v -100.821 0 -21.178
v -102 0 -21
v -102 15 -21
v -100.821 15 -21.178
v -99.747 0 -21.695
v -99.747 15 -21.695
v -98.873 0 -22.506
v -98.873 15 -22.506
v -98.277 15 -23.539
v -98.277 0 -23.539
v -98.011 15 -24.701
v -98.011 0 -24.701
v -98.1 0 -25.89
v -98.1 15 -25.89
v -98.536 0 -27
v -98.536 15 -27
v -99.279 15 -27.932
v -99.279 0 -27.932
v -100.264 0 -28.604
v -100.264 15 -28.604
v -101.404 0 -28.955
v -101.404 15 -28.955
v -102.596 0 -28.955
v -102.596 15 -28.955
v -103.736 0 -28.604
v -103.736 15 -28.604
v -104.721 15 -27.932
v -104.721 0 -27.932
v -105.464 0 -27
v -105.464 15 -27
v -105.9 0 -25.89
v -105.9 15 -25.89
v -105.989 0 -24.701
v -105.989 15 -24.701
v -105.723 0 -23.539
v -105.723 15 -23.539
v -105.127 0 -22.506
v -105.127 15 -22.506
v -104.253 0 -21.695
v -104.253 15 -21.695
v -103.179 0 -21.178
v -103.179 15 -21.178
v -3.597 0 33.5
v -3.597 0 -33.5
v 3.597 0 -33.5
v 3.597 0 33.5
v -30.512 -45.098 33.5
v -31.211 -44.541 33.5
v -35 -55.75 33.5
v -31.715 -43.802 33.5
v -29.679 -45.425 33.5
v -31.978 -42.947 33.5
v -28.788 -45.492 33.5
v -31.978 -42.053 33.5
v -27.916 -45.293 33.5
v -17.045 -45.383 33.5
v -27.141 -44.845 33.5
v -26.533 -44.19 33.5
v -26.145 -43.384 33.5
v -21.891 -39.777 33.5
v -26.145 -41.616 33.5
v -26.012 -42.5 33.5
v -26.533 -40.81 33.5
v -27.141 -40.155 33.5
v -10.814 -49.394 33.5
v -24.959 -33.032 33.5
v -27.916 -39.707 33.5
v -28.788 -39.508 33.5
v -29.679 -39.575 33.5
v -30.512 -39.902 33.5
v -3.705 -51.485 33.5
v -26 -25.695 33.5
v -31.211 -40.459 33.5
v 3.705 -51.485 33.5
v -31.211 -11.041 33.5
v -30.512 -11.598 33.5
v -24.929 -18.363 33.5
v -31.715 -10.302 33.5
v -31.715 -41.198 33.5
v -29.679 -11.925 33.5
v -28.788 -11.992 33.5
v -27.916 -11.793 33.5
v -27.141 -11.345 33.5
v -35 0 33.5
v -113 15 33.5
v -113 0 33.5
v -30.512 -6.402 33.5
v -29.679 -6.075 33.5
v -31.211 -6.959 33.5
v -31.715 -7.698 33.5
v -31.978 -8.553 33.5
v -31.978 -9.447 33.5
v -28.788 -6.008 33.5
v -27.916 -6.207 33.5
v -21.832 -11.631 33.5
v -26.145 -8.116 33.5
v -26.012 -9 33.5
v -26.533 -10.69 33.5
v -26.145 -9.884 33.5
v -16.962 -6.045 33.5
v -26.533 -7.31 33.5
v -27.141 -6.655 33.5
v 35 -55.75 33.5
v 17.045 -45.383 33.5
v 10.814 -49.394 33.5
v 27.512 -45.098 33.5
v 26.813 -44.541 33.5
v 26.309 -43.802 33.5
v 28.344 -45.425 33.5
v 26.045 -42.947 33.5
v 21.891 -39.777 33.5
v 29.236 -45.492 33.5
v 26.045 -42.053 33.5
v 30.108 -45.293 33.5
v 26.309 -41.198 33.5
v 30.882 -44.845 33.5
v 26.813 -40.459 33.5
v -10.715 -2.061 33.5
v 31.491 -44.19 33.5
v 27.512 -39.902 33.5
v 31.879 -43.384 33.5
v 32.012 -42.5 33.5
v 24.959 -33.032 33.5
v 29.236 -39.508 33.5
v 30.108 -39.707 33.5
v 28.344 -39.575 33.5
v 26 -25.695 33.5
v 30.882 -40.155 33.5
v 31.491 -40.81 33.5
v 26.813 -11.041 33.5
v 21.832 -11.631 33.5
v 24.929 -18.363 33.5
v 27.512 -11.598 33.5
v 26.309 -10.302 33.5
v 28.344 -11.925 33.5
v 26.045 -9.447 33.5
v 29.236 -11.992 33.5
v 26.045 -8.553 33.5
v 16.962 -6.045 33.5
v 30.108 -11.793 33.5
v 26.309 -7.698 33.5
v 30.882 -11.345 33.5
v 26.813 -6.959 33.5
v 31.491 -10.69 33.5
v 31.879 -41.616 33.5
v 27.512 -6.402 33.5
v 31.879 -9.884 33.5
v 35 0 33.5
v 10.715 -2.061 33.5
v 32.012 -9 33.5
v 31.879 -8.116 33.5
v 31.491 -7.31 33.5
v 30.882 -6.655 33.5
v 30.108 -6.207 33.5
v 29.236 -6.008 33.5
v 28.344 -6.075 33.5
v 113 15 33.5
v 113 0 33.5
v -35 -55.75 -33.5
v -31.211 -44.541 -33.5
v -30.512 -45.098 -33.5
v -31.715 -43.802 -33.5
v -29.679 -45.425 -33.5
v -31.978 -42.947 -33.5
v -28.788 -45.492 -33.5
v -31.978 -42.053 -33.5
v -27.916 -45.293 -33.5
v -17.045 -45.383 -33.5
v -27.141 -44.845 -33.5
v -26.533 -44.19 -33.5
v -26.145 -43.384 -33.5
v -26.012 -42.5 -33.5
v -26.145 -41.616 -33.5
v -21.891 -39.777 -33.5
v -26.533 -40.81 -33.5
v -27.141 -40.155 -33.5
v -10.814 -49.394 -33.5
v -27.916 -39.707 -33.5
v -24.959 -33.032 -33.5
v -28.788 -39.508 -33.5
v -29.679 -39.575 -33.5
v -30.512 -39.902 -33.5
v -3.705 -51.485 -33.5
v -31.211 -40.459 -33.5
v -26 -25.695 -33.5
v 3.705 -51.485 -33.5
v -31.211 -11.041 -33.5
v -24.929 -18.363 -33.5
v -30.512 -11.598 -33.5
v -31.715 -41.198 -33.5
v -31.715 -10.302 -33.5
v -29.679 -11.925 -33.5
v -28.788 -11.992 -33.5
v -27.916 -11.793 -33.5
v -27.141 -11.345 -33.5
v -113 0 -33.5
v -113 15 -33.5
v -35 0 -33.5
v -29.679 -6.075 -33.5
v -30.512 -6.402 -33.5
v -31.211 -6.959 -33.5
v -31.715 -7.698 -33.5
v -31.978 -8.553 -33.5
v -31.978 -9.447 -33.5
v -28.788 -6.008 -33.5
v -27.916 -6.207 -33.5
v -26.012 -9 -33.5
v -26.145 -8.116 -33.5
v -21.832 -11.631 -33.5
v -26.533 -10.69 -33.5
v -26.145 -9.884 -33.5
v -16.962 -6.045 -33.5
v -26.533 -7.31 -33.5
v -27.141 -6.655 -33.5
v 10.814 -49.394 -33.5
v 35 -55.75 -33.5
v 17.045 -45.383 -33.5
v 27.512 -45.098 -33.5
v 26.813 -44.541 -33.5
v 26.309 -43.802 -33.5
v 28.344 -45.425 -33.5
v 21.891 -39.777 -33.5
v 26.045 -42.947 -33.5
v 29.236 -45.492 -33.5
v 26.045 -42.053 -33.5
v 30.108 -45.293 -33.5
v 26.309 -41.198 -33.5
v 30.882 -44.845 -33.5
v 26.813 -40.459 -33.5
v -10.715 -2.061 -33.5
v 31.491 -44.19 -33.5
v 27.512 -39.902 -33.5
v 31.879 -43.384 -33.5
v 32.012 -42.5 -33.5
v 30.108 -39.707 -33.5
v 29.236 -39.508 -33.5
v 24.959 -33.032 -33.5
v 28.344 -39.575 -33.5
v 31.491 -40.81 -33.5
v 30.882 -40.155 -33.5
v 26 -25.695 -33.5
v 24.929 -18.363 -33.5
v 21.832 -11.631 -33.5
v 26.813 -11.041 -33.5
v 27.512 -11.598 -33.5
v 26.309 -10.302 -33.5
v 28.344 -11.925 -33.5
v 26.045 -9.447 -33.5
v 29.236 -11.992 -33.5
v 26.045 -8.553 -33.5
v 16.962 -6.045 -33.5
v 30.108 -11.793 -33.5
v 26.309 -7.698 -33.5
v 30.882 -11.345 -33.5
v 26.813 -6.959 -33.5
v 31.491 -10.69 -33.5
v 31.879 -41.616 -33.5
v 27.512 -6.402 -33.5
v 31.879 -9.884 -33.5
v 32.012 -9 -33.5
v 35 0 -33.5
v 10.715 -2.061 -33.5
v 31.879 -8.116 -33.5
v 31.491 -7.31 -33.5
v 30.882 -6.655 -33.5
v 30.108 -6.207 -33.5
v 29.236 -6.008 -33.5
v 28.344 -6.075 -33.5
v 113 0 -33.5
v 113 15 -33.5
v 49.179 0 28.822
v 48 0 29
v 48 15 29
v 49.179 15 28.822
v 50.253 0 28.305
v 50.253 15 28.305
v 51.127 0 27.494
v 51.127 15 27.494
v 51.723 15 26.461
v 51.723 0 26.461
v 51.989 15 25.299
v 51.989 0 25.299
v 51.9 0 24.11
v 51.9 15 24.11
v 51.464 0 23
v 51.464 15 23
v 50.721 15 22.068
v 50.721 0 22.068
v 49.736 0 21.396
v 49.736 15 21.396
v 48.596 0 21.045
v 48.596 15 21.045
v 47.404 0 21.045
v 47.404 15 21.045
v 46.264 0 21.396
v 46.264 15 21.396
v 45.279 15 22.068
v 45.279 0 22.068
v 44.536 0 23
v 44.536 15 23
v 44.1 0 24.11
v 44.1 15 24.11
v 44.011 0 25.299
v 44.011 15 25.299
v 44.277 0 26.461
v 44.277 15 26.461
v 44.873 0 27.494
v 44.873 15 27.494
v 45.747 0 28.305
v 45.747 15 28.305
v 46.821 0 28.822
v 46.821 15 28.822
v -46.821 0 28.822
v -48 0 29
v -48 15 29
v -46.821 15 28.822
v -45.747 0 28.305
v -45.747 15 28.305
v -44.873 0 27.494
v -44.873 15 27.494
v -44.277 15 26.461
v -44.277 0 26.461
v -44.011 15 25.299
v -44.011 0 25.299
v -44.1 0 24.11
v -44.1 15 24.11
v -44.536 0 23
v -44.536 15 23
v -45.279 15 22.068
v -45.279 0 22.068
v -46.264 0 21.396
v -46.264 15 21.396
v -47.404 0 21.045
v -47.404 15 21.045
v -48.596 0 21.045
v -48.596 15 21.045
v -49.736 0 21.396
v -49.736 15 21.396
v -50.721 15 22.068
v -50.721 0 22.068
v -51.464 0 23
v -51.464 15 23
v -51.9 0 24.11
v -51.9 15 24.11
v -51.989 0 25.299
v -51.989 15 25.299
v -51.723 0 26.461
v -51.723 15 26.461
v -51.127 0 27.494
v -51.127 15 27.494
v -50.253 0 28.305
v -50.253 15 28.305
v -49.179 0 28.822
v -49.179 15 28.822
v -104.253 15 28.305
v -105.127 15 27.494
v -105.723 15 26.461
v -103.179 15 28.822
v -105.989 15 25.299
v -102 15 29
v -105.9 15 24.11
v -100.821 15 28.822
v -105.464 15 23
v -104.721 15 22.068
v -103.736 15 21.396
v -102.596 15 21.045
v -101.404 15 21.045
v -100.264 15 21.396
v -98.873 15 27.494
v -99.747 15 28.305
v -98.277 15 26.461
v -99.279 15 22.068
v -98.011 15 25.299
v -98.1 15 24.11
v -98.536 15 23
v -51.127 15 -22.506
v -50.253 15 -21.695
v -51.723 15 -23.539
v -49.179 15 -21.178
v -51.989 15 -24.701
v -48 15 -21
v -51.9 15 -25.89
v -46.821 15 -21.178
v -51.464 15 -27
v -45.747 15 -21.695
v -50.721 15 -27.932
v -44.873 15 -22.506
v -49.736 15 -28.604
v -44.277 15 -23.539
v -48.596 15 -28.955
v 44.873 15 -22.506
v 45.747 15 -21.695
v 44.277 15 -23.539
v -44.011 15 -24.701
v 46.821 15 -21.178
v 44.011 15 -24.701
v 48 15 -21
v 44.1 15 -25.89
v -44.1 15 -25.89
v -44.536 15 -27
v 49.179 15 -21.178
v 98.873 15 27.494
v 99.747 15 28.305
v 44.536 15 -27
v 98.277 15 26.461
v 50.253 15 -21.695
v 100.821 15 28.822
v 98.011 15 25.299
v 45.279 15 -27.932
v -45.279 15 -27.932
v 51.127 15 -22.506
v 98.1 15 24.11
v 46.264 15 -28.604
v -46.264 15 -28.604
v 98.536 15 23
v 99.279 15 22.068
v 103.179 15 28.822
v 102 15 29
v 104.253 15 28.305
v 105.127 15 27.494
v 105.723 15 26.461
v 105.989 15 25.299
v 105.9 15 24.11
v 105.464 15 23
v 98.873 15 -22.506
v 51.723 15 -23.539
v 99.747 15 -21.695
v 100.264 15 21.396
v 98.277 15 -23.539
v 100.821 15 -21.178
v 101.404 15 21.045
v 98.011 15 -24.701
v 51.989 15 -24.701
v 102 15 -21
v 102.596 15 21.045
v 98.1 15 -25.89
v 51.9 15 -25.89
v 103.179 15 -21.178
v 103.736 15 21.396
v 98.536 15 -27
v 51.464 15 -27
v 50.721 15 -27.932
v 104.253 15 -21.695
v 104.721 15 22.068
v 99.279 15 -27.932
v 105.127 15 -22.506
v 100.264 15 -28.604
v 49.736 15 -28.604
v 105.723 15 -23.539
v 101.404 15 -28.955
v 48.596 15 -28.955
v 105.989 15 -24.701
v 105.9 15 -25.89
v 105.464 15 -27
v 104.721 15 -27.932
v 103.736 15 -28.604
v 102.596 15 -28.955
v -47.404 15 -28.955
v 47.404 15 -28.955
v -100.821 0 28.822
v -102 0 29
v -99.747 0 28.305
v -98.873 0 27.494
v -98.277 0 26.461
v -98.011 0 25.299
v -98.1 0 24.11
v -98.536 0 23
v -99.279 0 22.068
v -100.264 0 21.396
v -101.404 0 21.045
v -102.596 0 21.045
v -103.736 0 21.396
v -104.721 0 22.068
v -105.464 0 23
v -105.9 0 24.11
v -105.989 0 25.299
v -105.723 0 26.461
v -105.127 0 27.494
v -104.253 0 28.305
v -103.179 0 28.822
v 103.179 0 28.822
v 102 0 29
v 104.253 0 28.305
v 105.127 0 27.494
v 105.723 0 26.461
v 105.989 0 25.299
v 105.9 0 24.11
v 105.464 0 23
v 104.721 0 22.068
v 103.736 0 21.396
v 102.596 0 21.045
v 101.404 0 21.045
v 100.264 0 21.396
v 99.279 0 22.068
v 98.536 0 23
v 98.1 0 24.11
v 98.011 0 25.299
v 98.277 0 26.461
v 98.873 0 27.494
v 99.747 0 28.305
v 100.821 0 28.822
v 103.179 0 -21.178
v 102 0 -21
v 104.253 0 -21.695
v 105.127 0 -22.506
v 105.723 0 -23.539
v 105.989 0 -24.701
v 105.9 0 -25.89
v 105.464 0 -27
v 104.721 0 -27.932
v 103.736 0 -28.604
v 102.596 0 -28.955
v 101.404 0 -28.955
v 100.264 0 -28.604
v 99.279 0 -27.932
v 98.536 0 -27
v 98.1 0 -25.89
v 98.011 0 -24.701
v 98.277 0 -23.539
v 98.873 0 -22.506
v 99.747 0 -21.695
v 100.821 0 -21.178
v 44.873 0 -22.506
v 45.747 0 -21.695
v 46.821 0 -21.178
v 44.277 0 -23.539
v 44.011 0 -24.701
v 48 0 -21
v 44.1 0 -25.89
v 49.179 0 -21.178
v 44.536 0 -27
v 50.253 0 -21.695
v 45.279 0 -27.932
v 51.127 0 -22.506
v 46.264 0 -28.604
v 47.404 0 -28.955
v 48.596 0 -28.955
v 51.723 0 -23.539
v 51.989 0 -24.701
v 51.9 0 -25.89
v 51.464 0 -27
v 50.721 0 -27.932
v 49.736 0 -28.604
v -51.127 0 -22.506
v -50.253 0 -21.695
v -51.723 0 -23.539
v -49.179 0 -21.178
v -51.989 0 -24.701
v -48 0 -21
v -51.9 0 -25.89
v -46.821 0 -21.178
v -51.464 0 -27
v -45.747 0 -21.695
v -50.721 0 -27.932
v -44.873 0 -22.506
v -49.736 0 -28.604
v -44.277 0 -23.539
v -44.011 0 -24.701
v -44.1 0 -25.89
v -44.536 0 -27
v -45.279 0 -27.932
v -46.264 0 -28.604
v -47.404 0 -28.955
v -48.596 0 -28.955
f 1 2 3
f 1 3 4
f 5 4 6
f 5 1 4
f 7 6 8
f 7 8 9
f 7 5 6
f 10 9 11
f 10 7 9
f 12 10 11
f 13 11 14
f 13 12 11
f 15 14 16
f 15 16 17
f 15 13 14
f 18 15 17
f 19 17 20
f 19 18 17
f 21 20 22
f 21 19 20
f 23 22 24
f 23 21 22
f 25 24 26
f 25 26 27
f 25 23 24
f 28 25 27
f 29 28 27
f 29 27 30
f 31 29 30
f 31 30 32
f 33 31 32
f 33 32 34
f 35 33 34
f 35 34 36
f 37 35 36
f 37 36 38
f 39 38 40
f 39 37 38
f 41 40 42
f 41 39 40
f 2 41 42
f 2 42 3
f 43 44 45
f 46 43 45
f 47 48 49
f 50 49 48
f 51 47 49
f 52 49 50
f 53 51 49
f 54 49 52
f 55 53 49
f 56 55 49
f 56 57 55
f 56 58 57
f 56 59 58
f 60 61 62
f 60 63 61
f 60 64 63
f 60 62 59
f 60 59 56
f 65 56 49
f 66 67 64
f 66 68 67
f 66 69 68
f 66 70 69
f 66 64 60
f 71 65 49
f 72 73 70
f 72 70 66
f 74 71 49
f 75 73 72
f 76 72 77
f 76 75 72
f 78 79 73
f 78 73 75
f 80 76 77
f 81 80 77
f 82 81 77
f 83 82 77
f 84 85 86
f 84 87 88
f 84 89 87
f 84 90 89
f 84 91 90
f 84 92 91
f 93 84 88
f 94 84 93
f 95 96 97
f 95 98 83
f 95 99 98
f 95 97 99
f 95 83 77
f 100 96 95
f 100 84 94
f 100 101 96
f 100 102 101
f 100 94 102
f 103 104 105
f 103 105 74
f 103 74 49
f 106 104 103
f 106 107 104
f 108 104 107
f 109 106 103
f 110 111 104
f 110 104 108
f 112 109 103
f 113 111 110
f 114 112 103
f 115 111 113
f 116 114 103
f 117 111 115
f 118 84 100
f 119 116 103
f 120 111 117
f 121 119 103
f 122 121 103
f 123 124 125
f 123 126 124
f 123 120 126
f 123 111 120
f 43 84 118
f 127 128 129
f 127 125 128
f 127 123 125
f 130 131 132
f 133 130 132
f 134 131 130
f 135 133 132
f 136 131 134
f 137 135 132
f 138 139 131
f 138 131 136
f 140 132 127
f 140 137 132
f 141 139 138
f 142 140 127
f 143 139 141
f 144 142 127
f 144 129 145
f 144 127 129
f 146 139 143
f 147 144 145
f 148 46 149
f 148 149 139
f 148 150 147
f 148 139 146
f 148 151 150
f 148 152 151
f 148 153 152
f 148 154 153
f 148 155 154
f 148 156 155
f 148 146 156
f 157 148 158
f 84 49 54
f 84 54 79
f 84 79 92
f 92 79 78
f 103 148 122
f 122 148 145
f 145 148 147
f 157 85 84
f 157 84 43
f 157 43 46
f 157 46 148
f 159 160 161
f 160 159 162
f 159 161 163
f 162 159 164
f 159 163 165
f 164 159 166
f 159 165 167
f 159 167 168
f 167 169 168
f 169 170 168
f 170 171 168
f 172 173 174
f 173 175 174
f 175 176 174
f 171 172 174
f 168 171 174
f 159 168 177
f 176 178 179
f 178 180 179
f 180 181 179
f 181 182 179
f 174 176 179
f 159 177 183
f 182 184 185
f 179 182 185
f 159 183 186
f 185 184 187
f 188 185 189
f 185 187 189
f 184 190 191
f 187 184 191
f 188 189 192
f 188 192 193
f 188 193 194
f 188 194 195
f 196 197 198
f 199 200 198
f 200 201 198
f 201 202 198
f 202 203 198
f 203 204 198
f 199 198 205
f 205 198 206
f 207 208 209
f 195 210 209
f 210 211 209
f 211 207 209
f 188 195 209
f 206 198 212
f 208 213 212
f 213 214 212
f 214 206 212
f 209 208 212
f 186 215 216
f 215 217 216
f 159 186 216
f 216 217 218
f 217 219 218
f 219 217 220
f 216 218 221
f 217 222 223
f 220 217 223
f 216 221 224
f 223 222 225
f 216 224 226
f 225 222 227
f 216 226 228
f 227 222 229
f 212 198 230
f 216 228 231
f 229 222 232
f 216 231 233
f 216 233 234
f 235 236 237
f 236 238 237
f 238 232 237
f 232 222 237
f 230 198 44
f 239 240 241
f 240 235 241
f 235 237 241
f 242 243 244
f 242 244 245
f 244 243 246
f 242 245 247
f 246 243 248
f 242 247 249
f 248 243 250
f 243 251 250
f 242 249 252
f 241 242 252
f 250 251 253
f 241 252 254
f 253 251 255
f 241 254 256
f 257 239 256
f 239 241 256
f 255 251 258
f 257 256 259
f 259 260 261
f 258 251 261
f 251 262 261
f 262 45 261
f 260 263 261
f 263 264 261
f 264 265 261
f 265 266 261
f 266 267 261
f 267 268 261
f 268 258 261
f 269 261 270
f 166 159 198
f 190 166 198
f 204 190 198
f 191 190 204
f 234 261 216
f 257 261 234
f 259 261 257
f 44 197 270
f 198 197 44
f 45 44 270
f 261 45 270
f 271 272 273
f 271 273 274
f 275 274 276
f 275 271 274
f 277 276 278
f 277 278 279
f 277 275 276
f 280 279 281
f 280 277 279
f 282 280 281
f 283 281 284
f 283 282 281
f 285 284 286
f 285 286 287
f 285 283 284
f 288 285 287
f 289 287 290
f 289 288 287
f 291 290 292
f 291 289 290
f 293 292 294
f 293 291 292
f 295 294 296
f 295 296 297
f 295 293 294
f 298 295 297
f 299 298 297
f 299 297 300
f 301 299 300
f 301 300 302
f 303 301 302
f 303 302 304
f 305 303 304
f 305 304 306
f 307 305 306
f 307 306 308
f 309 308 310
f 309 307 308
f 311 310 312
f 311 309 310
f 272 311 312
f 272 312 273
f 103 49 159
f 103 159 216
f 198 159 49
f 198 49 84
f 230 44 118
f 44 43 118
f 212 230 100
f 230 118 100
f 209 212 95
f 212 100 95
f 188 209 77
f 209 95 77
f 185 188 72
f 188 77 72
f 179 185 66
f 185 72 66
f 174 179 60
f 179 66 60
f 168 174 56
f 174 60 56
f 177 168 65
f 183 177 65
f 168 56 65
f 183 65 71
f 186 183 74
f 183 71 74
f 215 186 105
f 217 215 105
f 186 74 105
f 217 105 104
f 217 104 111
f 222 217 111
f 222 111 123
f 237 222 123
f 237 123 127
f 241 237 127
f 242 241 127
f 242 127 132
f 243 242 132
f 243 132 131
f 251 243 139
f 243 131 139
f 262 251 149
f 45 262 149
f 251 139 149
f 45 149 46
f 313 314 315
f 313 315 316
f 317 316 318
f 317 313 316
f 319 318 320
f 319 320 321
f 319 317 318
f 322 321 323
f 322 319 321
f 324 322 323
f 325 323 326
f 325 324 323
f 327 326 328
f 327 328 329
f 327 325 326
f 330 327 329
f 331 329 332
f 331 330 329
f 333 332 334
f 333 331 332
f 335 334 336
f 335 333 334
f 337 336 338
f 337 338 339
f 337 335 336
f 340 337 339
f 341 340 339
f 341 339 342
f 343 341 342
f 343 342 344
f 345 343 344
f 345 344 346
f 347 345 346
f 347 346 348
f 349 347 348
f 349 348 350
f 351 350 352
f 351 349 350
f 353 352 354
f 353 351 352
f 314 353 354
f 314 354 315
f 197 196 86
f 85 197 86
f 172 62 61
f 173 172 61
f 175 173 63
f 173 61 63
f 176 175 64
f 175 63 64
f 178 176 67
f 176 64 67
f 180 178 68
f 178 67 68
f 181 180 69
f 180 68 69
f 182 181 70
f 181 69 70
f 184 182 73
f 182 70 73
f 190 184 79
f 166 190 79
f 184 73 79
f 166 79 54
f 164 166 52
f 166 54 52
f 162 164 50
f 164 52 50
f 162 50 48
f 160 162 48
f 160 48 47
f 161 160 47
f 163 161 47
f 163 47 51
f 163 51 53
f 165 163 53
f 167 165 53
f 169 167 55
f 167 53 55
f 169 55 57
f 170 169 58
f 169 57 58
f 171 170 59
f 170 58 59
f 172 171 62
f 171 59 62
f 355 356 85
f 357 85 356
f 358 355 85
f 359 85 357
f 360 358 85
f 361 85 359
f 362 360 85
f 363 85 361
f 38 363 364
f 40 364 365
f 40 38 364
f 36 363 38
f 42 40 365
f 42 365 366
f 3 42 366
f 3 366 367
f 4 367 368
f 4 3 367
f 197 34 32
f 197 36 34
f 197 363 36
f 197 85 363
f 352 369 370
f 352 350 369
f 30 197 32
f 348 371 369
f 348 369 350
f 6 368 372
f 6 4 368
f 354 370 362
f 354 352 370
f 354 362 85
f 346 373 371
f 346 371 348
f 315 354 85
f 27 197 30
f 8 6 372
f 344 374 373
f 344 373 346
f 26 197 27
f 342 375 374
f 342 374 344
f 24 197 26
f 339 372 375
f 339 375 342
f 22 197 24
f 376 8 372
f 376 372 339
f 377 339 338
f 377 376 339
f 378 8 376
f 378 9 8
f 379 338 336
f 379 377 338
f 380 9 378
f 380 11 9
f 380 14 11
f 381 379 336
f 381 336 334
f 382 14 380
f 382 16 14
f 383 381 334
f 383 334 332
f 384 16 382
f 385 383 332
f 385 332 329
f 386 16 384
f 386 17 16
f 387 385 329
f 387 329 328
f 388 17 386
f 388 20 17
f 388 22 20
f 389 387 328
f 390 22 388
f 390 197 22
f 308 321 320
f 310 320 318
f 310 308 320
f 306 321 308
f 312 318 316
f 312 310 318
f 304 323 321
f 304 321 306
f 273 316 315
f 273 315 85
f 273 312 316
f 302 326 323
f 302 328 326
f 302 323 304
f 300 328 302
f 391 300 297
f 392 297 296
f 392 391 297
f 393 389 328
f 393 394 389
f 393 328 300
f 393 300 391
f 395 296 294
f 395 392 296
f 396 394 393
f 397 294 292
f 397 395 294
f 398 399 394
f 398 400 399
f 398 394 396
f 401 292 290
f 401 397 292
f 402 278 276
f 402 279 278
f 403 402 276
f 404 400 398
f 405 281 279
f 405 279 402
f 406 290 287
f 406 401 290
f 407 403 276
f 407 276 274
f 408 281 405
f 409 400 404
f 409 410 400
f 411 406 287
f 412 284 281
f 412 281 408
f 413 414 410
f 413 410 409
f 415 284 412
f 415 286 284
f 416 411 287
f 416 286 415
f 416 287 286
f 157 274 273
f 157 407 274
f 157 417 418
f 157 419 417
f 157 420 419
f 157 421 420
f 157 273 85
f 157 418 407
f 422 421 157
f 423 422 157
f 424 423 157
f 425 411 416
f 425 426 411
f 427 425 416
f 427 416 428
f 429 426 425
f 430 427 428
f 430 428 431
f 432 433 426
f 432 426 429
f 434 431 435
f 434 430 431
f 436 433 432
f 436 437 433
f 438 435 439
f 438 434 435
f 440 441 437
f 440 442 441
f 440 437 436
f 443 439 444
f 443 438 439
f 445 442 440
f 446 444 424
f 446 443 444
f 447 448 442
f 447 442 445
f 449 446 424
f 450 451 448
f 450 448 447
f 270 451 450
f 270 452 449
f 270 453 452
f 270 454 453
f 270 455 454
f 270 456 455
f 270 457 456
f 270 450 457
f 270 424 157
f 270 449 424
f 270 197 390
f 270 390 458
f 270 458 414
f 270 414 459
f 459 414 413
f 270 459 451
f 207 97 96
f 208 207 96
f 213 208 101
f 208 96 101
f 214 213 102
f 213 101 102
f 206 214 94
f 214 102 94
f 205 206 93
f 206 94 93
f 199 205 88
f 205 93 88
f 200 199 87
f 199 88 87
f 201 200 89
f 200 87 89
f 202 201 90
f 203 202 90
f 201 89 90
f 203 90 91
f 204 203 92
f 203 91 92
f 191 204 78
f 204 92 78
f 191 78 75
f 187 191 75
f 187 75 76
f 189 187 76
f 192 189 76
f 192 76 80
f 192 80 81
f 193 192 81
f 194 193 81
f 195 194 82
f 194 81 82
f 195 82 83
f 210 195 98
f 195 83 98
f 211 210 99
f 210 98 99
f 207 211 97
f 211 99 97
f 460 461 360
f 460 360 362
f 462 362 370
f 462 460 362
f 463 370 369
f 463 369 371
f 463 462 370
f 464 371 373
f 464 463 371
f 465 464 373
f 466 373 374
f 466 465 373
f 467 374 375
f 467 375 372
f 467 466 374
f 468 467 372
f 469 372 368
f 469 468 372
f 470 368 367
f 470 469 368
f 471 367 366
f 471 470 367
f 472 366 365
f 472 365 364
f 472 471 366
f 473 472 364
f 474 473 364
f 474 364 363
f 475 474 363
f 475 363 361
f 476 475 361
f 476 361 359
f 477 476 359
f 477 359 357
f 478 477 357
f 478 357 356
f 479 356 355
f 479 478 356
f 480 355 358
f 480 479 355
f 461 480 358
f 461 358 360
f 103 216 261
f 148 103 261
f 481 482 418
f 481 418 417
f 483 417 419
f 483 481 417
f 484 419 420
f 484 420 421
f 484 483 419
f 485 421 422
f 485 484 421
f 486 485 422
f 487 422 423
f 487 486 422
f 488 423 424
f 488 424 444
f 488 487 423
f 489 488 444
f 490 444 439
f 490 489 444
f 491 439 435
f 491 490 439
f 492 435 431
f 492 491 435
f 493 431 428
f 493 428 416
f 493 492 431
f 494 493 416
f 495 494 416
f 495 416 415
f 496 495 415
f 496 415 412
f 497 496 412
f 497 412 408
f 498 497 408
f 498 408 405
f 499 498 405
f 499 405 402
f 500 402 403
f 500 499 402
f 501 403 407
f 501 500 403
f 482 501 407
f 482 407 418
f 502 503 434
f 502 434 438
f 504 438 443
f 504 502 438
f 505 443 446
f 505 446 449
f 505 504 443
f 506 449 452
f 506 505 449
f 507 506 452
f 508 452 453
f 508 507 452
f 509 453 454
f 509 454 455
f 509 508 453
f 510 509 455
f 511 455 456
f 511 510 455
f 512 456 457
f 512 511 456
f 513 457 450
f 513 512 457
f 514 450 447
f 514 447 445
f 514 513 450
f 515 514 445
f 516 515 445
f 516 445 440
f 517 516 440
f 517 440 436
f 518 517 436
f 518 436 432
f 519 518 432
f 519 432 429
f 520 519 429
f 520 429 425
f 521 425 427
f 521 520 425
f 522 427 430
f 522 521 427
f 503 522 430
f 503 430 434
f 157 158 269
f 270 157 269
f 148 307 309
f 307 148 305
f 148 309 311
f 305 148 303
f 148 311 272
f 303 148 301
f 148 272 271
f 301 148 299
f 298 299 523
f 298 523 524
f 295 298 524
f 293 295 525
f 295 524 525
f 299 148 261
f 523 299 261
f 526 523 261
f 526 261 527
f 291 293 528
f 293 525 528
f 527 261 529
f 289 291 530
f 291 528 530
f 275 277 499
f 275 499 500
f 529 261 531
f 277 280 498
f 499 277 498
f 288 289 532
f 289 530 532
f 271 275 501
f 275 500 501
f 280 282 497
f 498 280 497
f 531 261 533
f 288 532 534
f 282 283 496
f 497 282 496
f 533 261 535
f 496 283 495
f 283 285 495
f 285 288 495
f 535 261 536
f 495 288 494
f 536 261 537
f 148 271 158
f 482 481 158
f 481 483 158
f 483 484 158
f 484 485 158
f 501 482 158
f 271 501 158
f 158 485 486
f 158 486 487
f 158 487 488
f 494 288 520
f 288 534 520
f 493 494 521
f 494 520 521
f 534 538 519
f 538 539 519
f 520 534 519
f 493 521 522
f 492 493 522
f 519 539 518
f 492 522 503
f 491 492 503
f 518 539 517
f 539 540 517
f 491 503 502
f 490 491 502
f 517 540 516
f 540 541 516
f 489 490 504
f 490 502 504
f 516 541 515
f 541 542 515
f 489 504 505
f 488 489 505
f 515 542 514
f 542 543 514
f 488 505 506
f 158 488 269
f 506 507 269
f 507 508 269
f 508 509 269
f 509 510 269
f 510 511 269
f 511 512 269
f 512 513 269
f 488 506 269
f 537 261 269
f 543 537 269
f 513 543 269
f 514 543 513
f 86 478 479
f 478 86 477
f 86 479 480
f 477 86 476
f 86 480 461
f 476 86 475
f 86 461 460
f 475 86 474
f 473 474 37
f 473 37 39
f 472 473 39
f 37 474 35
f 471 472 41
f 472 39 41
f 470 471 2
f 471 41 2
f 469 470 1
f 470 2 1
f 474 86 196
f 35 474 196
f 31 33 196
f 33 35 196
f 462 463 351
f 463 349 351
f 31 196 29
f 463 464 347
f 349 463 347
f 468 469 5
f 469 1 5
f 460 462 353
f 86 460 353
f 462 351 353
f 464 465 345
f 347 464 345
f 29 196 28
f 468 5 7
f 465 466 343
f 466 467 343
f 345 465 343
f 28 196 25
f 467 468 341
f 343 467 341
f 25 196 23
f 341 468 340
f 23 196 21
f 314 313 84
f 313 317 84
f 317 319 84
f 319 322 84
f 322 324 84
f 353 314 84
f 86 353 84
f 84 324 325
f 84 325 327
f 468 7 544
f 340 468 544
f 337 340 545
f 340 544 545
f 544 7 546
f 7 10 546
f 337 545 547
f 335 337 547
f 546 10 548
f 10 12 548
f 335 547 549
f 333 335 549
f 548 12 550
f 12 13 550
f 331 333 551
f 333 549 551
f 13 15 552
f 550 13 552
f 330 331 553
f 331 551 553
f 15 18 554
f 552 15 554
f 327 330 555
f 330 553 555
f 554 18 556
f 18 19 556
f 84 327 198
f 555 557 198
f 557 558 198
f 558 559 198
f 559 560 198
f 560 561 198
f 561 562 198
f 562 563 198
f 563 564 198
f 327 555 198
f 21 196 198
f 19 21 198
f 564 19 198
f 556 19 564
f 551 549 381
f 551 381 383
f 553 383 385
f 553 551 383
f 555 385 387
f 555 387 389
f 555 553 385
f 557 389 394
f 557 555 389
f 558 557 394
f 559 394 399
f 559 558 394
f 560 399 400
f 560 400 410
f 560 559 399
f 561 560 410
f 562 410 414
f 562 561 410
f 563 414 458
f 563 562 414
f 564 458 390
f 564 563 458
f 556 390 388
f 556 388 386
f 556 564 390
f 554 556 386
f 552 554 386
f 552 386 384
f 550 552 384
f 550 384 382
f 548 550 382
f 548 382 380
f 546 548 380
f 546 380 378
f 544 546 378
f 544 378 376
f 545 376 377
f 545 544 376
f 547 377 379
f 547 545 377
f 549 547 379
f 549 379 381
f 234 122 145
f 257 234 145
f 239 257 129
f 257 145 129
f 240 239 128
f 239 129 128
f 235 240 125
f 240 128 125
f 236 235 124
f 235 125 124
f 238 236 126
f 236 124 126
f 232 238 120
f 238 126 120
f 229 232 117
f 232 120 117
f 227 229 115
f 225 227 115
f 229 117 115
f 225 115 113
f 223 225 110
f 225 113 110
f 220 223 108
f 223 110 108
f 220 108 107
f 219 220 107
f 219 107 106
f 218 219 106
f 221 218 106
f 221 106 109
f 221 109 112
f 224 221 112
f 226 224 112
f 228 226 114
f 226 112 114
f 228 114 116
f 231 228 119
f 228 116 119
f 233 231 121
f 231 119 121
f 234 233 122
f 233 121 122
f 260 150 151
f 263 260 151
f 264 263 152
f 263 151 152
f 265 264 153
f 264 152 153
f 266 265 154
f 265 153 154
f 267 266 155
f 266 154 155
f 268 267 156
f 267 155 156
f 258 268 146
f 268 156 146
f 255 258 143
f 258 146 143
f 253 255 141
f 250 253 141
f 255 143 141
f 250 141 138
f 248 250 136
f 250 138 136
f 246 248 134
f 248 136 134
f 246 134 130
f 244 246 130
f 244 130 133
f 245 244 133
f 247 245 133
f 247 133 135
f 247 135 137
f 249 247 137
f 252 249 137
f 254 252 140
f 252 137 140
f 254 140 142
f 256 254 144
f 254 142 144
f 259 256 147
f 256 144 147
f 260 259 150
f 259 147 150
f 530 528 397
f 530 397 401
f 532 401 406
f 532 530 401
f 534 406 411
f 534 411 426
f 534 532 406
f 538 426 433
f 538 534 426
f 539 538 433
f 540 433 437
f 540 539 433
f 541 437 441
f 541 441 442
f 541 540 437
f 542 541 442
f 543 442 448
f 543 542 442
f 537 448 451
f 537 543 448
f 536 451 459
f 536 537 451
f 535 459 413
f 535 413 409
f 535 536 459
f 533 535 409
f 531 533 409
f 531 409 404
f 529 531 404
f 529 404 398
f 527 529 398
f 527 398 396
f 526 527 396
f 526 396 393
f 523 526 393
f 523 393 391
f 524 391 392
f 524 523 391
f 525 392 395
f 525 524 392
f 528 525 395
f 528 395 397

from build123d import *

# Parameters (mm, degrees)
SKETCH1_R           = 4
BOSS_EXTRUDE1_DEPTH = 15
SKETCH2_W           = 70
SKETCH2_H           = 60
SKETCH2_R           = 26
SKETCH2_R_2         = 3
BOSS_EXTRUDE3_DEPTH = 67


with BuildPart() as part:
    # Sketch1 → Boss-Extrude1 (new body)
    # profile 1 of 3: a face of its own
    with BuildSketch(Plane(origin=(0, 0, 0), x_dir=(1, 0, 0), z_dir=(0, 1, 0))):
        Polygon((37, 33.5), (-37, 33.5), (-113, 33.5), (-113, -33.5), (-37, -33.5), (37, -33.5), (113, -33.5), (113, 33.5), align=None)
        with Locations(Location((-102, -25, 0), (0, 0, 270))):
            Circle(SKETCH1_R, mode=Mode.SUBTRACT)
        with Locations(Location((-48, -25, 0), (0, 0, 270))):
            Circle(SKETCH1_R, mode=Mode.SUBTRACT)
        with Locations(Location((48, -25, 0), (0, 0, 270))):
            Circle(SKETCH1_R, mode=Mode.SUBTRACT)
        with Locations(Location((102, -25, 0), (0, 0, 270))):
            Circle(SKETCH1_R, mode=Mode.SUBTRACT)
        with Locations(Location((-102, 25, 0), (0, 0, 270))):
            Circle(SKETCH1_R, mode=Mode.SUBTRACT)
        with Locations(Location((-48, 25, 0), (0, 0, 270))):
            Circle(SKETCH1_R, mode=Mode.SUBTRACT)
        with Locations(Location((48, 25, 0), (0, 0, 270))):
            Circle(SKETCH1_R, mode=Mode.SUBTRACT)
        with Locations(Location((102, 25, 0), (0, 0, 270))):
            Circle(SKETCH1_R, mode=Mode.SUBTRACT)
    # profile 2 of 3: a face of its own
    with BuildSketch(Plane(origin=(0, 0, 0), x_dir=(1, 0, 0), z_dir=(0, 1, 0))):
        Polygon((37, 33.5), (-37, 33.5), (-113, 33.5), (-113, -33.5), (-37, -33.5), (37, -33.5), (113, -33.5), (113, 33.5), align=None)
        with Locations(Location((-102, -25, 0), (0, 0, 270))):
            Circle(SKETCH1_R, mode=Mode.SUBTRACT)
        with Locations(Location((-48, -25, 0), (0, 0, 270))):
            Circle(SKETCH1_R, mode=Mode.SUBTRACT)
        with Locations(Location((48, -25, 0), (0, 0, 270))):
            Circle(SKETCH1_R, mode=Mode.SUBTRACT)
        with Locations(Location((102, -25, 0), (0, 0, 270))):
            Circle(SKETCH1_R, mode=Mode.SUBTRACT)
        with Locations(Location((-102, 25, 0), (0, 0, 270))):
            Circle(SKETCH1_R, mode=Mode.SUBTRACT)
        with Locations(Location((-48, 25, 0), (0, 0, 270))):
            Circle(SKETCH1_R, mode=Mode.SUBTRACT)
        with Locations(Location((48, 25, 0), (0, 0, 270))):
            Circle(SKETCH1_R, mode=Mode.SUBTRACT)
        with Locations(Location((102, 25, 0), (0, 0, 270))):
            Circle(SKETCH1_R, mode=Mode.SUBTRACT)
    # profile 3 of 3: a face of its own
    with BuildSketch(Plane(origin=(0, 0, 0), x_dir=(1, 0, 0), z_dir=(0, 1, 0))):
        Polygon((37, 33.5), (-37, 33.5), (-113, 33.5), (-113, -33.5), (-37, -33.5), (37, -33.5), (113, -33.5), (113, 33.5), align=None)
        with Locations(Location((-102, -25, 0), (0, 0, 270))):
            Circle(SKETCH1_R, mode=Mode.SUBTRACT)
        with Locations(Location((-48, -25, 0), (0, 0, 270))):
            Circle(SKETCH1_R, mode=Mode.SUBTRACT)
        with Locations(Location((48, -25, 0), (0, 0, 270))):
            Circle(SKETCH1_R, mode=Mode.SUBTRACT)
        with Locations(Location((102, -25, 0), (0, 0, 270))):
            Circle(SKETCH1_R, mode=Mode.SUBTRACT)
        with Locations(Location((-102, 25, 0), (0, 0, 270))):
            Circle(SKETCH1_R, mode=Mode.SUBTRACT)
        with Locations(Location((-48, 25, 0), (0, 0, 270))):
            Circle(SKETCH1_R, mode=Mode.SUBTRACT)
        with Locations(Location((48, 25, 0), (0, 0, 270))):
            Circle(SKETCH1_R, mode=Mode.SUBTRACT)
        with Locations(Location((102, 25, 0), (0, 0, 270))):
            Circle(SKETCH1_R, mode=Mode.SUBTRACT)
    extrude(amount=BOSS_EXTRUDE1_DEPTH)

    # Sketch2 → Boss-Extrude3 (add)
    with BuildSketch(Plane.XY.offset(33.5)):
        with Locations((0, -25.75)):
            Rectangle(SKETCH2_W, SKETCH2_H)
        with Locations((0, -25.75)):
            Circle(SKETCH2_R, mode=Mode.SUBTRACT)
        with Locations((-29.011851027, -9)):
            Circle(SKETCH2_R_2, mode=Mode.SUBTRACT)
        with Locations((-29.011851027, -42.5)):
            Circle(SKETCH2_R_2, mode=Mode.SUBTRACT)
        with Locations((29.011851027, -42.5)):
            Circle(SKETCH2_R_2, mode=Mode.SUBTRACT)
        with Locations((29.011851027, -9)):
            Circle(SKETCH2_R_2, mode=Mode.SUBTRACT)
    extrude(amount=-BOSS_EXTRUDE3_DEPTH)


solid = part.part
